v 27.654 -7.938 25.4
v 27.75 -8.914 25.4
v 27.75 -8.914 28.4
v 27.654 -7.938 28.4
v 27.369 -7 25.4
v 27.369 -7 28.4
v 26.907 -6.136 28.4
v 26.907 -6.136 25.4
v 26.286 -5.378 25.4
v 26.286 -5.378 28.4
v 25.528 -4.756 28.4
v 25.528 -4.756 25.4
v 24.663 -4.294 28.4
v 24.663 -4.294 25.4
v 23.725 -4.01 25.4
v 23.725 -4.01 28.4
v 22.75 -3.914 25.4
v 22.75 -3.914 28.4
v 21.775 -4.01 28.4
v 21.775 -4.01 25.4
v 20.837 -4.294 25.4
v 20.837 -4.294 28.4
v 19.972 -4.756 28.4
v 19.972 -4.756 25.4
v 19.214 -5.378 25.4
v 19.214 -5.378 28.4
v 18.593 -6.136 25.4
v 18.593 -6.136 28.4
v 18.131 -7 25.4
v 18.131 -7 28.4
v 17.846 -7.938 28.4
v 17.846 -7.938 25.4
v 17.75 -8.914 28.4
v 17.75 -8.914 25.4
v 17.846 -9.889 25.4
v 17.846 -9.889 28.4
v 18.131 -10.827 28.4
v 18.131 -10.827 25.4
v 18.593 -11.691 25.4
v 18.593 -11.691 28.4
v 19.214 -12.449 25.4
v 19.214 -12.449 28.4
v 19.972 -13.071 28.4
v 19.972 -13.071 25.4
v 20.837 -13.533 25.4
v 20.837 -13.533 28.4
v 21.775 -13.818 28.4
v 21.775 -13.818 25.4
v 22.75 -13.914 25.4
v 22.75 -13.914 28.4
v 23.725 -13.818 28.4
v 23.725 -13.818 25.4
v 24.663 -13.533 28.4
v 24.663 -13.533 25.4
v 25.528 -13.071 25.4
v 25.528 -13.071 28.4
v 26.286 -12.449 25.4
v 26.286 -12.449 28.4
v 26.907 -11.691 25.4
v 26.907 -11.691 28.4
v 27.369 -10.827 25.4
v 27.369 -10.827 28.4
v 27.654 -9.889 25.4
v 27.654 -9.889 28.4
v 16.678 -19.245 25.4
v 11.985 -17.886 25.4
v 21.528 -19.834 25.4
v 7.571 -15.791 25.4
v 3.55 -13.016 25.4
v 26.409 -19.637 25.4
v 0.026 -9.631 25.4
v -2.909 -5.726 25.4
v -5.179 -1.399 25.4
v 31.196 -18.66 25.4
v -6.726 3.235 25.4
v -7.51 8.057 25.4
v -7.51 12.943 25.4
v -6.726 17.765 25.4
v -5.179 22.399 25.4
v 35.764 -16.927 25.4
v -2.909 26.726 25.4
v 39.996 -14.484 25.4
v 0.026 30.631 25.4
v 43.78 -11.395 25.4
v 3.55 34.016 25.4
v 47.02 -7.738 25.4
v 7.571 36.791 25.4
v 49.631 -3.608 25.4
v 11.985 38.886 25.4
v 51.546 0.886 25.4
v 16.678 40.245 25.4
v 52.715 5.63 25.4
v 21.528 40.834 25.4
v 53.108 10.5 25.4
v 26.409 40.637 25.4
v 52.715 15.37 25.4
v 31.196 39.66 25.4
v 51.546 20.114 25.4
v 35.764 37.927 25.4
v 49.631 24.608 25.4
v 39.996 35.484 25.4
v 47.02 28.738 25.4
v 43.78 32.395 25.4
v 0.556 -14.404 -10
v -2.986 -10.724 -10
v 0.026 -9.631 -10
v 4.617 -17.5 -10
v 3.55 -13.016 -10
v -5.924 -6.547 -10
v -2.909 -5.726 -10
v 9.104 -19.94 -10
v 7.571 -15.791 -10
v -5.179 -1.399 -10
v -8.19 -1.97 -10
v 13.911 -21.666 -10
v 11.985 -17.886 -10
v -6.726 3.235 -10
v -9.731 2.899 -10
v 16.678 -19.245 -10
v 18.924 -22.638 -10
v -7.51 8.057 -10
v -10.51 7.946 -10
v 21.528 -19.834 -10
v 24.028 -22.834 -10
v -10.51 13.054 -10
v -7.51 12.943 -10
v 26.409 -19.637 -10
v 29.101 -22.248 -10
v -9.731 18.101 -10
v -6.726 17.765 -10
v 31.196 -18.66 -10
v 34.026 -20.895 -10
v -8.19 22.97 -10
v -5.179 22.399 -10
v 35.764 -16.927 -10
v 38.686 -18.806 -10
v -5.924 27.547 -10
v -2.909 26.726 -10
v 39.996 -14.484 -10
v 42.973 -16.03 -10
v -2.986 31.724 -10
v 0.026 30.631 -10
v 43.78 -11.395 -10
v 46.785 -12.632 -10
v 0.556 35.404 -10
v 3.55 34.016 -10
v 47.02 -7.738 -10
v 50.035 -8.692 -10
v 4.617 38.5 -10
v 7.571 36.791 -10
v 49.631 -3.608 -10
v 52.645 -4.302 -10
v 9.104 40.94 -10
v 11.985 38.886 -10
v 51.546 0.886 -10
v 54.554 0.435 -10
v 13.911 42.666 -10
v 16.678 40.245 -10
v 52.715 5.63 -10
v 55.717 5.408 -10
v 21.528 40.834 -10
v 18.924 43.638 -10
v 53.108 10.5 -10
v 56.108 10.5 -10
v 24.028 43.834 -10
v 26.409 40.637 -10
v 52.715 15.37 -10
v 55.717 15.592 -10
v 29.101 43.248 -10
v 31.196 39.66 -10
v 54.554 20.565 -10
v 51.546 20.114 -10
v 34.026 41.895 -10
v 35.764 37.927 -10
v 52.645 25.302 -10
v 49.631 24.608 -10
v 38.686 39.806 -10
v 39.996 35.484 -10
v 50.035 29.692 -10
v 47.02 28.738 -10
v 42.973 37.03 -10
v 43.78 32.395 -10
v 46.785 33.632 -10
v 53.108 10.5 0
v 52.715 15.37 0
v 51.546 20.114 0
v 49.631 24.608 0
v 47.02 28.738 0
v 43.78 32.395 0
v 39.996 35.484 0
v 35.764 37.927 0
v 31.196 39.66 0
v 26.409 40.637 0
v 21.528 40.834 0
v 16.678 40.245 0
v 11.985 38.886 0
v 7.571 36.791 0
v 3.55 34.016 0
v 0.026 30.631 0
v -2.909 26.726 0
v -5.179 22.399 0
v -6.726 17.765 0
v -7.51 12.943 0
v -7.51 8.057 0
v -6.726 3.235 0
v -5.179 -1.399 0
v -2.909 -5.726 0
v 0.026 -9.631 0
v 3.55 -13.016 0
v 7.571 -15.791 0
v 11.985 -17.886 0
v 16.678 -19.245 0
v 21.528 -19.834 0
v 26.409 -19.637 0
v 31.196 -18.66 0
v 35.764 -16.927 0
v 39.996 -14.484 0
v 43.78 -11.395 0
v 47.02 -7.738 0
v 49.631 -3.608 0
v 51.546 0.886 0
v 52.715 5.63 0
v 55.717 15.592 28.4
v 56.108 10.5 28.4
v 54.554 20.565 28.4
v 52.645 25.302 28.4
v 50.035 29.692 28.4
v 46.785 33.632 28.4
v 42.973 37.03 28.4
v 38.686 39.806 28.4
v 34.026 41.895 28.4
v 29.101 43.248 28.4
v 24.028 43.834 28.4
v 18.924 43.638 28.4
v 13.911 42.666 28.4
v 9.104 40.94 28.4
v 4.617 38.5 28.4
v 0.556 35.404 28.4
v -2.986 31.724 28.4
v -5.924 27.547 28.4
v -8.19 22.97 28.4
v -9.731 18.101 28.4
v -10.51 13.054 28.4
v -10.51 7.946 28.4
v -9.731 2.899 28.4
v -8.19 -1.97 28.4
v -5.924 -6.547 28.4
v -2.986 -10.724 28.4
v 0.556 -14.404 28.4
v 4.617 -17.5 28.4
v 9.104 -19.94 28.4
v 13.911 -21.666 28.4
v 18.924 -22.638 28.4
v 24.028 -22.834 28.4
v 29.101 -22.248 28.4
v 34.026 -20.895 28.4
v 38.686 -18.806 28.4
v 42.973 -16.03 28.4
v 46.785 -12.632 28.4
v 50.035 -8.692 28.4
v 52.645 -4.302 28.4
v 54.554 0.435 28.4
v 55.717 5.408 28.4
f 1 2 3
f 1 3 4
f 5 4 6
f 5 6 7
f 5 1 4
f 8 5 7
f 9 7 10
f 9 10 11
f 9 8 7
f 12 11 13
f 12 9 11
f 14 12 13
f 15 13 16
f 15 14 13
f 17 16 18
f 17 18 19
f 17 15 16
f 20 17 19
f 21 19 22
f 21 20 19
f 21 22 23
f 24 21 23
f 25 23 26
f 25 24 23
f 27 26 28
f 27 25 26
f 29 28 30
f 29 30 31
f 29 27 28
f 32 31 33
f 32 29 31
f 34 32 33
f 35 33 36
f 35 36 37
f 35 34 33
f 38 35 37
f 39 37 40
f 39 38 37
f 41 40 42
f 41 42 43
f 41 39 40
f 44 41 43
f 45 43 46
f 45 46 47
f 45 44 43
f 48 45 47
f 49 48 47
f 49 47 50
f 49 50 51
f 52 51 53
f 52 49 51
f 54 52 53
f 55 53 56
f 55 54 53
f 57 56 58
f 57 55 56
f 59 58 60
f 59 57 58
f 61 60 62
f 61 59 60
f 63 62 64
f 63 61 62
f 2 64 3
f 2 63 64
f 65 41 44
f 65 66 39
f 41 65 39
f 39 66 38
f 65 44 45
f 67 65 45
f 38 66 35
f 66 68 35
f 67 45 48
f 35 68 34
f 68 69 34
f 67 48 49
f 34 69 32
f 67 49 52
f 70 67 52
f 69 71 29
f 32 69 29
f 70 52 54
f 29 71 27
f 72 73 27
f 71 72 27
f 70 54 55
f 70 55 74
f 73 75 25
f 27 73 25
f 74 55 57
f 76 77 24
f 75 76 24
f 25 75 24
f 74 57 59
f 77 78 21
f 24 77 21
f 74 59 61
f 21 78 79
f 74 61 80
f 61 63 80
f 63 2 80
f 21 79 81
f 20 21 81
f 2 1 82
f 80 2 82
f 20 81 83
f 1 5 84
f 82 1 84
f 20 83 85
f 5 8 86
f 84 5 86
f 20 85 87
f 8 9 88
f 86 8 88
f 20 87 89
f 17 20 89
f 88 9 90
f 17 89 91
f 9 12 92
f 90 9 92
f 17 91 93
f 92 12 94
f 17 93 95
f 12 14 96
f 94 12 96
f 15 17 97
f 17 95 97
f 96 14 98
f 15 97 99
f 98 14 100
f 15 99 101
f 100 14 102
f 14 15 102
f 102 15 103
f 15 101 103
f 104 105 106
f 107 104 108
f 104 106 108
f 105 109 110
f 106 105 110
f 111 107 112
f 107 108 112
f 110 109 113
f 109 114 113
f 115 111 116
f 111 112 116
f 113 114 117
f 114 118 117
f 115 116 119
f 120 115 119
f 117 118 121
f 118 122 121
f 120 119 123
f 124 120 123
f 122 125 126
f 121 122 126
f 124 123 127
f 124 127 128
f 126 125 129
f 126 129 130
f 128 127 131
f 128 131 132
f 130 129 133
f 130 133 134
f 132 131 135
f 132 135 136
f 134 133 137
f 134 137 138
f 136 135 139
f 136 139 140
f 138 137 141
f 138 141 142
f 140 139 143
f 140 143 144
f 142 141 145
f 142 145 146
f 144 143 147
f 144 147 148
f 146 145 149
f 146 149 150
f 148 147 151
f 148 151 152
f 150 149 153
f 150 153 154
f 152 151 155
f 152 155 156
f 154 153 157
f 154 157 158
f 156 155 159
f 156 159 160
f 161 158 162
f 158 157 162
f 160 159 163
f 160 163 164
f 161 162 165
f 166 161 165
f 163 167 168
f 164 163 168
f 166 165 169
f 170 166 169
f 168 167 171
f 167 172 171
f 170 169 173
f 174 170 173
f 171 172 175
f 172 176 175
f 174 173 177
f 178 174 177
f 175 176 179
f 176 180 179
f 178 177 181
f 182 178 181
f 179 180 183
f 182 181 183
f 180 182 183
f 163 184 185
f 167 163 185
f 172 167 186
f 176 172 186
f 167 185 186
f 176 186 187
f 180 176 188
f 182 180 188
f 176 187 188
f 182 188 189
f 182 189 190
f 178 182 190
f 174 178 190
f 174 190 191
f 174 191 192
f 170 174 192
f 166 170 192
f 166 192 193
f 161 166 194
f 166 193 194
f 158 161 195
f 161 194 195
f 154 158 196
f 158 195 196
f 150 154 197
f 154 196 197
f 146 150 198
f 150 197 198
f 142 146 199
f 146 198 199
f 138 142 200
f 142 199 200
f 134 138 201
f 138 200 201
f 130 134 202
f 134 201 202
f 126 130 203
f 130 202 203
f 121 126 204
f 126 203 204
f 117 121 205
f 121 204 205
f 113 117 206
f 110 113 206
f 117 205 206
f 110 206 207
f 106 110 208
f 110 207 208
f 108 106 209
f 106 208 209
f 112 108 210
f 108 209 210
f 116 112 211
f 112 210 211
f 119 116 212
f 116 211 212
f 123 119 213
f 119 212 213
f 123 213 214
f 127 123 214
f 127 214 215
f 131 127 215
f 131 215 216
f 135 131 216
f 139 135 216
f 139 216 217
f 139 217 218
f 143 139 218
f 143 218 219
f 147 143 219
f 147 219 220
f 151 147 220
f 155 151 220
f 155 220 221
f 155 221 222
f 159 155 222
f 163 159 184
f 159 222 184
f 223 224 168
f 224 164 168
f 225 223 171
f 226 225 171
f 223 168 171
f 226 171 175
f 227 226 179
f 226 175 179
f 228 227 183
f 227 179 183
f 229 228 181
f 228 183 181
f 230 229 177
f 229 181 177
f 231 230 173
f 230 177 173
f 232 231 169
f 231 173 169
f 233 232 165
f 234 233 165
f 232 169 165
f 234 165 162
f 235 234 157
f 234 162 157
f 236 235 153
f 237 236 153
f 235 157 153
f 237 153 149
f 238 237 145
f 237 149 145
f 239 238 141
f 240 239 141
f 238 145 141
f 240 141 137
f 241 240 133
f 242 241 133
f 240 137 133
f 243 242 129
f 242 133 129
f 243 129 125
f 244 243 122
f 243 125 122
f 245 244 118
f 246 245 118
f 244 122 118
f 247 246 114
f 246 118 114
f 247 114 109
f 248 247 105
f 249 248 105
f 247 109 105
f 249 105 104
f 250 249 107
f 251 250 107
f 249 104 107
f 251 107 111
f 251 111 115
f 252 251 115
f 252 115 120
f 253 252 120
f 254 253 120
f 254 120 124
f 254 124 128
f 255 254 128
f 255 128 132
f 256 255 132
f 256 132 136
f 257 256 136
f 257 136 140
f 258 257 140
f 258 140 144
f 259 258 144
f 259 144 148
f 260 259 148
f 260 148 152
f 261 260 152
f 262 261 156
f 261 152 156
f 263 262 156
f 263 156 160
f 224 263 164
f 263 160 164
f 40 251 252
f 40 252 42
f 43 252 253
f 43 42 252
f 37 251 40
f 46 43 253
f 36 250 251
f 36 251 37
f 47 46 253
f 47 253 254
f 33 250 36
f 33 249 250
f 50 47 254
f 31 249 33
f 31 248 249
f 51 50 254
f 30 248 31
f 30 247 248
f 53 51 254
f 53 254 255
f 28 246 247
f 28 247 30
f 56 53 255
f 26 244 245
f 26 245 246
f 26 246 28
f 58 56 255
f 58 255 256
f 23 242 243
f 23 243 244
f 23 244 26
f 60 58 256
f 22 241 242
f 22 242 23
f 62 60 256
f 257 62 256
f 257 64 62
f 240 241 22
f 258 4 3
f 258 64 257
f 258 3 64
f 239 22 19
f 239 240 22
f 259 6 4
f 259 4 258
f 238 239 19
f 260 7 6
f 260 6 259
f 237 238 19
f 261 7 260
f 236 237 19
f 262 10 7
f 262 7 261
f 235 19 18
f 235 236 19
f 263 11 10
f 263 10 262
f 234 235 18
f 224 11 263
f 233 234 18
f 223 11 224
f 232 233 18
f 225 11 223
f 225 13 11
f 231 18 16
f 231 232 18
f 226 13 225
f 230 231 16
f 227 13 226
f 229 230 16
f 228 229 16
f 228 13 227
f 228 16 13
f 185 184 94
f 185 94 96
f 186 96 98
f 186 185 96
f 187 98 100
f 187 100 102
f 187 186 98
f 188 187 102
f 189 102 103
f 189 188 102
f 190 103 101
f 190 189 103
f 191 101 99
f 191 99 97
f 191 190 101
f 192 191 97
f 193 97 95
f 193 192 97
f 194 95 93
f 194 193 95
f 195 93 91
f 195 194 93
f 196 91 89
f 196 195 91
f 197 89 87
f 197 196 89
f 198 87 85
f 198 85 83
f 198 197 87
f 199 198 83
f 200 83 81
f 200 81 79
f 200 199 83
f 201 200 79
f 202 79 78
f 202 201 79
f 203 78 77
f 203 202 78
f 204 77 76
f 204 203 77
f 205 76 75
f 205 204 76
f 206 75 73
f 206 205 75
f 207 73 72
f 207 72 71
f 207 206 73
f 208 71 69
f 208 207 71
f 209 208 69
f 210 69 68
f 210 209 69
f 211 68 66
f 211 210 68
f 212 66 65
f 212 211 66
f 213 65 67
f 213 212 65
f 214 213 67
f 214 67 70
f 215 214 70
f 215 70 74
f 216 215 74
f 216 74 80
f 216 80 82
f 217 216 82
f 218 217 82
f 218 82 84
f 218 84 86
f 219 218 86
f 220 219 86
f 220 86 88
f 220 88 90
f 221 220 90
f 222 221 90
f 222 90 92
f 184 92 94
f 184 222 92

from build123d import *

# Parameters (mm, degrees)
SKETCH1_R                = 33.358351357
SKETCH1_R_2              = 30.358351357
BOSS_EXTRUDE1_DEPTH      = 25.4
BOSS_EXTRUDE1_DEPTH_BACK = 10
SKETCH2_R                = 33.358351357
SKETCH2_R_2              = 5
BOSS_EXTRUDE2_DEPTH      = 3


with BuildPart() as part:
    # Sketch1 → Boss-Extrude1 (new body, two sides)
    with BuildSketch(Plane.XY) as boss_extrude1_sk:
        with Locations((22.75, 10.5)):
            Circle(SKETCH1_R)
        with Locations((22.75, 10.5)):
            Circle(SKETCH1_R_2, mode=Mode.SUBTRACT)
    extrude(amount=BOSS_EXTRUDE1_DEPTH)
    extrude(boss_extrude1_sk.sketch, amount=-BOSS_EXTRUDE1_DEPTH_BACK)

    # Sketch2 → Boss-Extrude2 (add)
    with BuildSketch(Plane.XY.offset(25.4)):
        with Locations((22.75, 10.5)):
            Circle(SKETCH2_R)
        with Locations((22.75, -8.913617173)):
            Circle(SKETCH2_R_2, mode=Mode.SUBTRACT)
    extrude(amount=BOSS_EXTRUDE2_DEPTH)


solid = part.part
